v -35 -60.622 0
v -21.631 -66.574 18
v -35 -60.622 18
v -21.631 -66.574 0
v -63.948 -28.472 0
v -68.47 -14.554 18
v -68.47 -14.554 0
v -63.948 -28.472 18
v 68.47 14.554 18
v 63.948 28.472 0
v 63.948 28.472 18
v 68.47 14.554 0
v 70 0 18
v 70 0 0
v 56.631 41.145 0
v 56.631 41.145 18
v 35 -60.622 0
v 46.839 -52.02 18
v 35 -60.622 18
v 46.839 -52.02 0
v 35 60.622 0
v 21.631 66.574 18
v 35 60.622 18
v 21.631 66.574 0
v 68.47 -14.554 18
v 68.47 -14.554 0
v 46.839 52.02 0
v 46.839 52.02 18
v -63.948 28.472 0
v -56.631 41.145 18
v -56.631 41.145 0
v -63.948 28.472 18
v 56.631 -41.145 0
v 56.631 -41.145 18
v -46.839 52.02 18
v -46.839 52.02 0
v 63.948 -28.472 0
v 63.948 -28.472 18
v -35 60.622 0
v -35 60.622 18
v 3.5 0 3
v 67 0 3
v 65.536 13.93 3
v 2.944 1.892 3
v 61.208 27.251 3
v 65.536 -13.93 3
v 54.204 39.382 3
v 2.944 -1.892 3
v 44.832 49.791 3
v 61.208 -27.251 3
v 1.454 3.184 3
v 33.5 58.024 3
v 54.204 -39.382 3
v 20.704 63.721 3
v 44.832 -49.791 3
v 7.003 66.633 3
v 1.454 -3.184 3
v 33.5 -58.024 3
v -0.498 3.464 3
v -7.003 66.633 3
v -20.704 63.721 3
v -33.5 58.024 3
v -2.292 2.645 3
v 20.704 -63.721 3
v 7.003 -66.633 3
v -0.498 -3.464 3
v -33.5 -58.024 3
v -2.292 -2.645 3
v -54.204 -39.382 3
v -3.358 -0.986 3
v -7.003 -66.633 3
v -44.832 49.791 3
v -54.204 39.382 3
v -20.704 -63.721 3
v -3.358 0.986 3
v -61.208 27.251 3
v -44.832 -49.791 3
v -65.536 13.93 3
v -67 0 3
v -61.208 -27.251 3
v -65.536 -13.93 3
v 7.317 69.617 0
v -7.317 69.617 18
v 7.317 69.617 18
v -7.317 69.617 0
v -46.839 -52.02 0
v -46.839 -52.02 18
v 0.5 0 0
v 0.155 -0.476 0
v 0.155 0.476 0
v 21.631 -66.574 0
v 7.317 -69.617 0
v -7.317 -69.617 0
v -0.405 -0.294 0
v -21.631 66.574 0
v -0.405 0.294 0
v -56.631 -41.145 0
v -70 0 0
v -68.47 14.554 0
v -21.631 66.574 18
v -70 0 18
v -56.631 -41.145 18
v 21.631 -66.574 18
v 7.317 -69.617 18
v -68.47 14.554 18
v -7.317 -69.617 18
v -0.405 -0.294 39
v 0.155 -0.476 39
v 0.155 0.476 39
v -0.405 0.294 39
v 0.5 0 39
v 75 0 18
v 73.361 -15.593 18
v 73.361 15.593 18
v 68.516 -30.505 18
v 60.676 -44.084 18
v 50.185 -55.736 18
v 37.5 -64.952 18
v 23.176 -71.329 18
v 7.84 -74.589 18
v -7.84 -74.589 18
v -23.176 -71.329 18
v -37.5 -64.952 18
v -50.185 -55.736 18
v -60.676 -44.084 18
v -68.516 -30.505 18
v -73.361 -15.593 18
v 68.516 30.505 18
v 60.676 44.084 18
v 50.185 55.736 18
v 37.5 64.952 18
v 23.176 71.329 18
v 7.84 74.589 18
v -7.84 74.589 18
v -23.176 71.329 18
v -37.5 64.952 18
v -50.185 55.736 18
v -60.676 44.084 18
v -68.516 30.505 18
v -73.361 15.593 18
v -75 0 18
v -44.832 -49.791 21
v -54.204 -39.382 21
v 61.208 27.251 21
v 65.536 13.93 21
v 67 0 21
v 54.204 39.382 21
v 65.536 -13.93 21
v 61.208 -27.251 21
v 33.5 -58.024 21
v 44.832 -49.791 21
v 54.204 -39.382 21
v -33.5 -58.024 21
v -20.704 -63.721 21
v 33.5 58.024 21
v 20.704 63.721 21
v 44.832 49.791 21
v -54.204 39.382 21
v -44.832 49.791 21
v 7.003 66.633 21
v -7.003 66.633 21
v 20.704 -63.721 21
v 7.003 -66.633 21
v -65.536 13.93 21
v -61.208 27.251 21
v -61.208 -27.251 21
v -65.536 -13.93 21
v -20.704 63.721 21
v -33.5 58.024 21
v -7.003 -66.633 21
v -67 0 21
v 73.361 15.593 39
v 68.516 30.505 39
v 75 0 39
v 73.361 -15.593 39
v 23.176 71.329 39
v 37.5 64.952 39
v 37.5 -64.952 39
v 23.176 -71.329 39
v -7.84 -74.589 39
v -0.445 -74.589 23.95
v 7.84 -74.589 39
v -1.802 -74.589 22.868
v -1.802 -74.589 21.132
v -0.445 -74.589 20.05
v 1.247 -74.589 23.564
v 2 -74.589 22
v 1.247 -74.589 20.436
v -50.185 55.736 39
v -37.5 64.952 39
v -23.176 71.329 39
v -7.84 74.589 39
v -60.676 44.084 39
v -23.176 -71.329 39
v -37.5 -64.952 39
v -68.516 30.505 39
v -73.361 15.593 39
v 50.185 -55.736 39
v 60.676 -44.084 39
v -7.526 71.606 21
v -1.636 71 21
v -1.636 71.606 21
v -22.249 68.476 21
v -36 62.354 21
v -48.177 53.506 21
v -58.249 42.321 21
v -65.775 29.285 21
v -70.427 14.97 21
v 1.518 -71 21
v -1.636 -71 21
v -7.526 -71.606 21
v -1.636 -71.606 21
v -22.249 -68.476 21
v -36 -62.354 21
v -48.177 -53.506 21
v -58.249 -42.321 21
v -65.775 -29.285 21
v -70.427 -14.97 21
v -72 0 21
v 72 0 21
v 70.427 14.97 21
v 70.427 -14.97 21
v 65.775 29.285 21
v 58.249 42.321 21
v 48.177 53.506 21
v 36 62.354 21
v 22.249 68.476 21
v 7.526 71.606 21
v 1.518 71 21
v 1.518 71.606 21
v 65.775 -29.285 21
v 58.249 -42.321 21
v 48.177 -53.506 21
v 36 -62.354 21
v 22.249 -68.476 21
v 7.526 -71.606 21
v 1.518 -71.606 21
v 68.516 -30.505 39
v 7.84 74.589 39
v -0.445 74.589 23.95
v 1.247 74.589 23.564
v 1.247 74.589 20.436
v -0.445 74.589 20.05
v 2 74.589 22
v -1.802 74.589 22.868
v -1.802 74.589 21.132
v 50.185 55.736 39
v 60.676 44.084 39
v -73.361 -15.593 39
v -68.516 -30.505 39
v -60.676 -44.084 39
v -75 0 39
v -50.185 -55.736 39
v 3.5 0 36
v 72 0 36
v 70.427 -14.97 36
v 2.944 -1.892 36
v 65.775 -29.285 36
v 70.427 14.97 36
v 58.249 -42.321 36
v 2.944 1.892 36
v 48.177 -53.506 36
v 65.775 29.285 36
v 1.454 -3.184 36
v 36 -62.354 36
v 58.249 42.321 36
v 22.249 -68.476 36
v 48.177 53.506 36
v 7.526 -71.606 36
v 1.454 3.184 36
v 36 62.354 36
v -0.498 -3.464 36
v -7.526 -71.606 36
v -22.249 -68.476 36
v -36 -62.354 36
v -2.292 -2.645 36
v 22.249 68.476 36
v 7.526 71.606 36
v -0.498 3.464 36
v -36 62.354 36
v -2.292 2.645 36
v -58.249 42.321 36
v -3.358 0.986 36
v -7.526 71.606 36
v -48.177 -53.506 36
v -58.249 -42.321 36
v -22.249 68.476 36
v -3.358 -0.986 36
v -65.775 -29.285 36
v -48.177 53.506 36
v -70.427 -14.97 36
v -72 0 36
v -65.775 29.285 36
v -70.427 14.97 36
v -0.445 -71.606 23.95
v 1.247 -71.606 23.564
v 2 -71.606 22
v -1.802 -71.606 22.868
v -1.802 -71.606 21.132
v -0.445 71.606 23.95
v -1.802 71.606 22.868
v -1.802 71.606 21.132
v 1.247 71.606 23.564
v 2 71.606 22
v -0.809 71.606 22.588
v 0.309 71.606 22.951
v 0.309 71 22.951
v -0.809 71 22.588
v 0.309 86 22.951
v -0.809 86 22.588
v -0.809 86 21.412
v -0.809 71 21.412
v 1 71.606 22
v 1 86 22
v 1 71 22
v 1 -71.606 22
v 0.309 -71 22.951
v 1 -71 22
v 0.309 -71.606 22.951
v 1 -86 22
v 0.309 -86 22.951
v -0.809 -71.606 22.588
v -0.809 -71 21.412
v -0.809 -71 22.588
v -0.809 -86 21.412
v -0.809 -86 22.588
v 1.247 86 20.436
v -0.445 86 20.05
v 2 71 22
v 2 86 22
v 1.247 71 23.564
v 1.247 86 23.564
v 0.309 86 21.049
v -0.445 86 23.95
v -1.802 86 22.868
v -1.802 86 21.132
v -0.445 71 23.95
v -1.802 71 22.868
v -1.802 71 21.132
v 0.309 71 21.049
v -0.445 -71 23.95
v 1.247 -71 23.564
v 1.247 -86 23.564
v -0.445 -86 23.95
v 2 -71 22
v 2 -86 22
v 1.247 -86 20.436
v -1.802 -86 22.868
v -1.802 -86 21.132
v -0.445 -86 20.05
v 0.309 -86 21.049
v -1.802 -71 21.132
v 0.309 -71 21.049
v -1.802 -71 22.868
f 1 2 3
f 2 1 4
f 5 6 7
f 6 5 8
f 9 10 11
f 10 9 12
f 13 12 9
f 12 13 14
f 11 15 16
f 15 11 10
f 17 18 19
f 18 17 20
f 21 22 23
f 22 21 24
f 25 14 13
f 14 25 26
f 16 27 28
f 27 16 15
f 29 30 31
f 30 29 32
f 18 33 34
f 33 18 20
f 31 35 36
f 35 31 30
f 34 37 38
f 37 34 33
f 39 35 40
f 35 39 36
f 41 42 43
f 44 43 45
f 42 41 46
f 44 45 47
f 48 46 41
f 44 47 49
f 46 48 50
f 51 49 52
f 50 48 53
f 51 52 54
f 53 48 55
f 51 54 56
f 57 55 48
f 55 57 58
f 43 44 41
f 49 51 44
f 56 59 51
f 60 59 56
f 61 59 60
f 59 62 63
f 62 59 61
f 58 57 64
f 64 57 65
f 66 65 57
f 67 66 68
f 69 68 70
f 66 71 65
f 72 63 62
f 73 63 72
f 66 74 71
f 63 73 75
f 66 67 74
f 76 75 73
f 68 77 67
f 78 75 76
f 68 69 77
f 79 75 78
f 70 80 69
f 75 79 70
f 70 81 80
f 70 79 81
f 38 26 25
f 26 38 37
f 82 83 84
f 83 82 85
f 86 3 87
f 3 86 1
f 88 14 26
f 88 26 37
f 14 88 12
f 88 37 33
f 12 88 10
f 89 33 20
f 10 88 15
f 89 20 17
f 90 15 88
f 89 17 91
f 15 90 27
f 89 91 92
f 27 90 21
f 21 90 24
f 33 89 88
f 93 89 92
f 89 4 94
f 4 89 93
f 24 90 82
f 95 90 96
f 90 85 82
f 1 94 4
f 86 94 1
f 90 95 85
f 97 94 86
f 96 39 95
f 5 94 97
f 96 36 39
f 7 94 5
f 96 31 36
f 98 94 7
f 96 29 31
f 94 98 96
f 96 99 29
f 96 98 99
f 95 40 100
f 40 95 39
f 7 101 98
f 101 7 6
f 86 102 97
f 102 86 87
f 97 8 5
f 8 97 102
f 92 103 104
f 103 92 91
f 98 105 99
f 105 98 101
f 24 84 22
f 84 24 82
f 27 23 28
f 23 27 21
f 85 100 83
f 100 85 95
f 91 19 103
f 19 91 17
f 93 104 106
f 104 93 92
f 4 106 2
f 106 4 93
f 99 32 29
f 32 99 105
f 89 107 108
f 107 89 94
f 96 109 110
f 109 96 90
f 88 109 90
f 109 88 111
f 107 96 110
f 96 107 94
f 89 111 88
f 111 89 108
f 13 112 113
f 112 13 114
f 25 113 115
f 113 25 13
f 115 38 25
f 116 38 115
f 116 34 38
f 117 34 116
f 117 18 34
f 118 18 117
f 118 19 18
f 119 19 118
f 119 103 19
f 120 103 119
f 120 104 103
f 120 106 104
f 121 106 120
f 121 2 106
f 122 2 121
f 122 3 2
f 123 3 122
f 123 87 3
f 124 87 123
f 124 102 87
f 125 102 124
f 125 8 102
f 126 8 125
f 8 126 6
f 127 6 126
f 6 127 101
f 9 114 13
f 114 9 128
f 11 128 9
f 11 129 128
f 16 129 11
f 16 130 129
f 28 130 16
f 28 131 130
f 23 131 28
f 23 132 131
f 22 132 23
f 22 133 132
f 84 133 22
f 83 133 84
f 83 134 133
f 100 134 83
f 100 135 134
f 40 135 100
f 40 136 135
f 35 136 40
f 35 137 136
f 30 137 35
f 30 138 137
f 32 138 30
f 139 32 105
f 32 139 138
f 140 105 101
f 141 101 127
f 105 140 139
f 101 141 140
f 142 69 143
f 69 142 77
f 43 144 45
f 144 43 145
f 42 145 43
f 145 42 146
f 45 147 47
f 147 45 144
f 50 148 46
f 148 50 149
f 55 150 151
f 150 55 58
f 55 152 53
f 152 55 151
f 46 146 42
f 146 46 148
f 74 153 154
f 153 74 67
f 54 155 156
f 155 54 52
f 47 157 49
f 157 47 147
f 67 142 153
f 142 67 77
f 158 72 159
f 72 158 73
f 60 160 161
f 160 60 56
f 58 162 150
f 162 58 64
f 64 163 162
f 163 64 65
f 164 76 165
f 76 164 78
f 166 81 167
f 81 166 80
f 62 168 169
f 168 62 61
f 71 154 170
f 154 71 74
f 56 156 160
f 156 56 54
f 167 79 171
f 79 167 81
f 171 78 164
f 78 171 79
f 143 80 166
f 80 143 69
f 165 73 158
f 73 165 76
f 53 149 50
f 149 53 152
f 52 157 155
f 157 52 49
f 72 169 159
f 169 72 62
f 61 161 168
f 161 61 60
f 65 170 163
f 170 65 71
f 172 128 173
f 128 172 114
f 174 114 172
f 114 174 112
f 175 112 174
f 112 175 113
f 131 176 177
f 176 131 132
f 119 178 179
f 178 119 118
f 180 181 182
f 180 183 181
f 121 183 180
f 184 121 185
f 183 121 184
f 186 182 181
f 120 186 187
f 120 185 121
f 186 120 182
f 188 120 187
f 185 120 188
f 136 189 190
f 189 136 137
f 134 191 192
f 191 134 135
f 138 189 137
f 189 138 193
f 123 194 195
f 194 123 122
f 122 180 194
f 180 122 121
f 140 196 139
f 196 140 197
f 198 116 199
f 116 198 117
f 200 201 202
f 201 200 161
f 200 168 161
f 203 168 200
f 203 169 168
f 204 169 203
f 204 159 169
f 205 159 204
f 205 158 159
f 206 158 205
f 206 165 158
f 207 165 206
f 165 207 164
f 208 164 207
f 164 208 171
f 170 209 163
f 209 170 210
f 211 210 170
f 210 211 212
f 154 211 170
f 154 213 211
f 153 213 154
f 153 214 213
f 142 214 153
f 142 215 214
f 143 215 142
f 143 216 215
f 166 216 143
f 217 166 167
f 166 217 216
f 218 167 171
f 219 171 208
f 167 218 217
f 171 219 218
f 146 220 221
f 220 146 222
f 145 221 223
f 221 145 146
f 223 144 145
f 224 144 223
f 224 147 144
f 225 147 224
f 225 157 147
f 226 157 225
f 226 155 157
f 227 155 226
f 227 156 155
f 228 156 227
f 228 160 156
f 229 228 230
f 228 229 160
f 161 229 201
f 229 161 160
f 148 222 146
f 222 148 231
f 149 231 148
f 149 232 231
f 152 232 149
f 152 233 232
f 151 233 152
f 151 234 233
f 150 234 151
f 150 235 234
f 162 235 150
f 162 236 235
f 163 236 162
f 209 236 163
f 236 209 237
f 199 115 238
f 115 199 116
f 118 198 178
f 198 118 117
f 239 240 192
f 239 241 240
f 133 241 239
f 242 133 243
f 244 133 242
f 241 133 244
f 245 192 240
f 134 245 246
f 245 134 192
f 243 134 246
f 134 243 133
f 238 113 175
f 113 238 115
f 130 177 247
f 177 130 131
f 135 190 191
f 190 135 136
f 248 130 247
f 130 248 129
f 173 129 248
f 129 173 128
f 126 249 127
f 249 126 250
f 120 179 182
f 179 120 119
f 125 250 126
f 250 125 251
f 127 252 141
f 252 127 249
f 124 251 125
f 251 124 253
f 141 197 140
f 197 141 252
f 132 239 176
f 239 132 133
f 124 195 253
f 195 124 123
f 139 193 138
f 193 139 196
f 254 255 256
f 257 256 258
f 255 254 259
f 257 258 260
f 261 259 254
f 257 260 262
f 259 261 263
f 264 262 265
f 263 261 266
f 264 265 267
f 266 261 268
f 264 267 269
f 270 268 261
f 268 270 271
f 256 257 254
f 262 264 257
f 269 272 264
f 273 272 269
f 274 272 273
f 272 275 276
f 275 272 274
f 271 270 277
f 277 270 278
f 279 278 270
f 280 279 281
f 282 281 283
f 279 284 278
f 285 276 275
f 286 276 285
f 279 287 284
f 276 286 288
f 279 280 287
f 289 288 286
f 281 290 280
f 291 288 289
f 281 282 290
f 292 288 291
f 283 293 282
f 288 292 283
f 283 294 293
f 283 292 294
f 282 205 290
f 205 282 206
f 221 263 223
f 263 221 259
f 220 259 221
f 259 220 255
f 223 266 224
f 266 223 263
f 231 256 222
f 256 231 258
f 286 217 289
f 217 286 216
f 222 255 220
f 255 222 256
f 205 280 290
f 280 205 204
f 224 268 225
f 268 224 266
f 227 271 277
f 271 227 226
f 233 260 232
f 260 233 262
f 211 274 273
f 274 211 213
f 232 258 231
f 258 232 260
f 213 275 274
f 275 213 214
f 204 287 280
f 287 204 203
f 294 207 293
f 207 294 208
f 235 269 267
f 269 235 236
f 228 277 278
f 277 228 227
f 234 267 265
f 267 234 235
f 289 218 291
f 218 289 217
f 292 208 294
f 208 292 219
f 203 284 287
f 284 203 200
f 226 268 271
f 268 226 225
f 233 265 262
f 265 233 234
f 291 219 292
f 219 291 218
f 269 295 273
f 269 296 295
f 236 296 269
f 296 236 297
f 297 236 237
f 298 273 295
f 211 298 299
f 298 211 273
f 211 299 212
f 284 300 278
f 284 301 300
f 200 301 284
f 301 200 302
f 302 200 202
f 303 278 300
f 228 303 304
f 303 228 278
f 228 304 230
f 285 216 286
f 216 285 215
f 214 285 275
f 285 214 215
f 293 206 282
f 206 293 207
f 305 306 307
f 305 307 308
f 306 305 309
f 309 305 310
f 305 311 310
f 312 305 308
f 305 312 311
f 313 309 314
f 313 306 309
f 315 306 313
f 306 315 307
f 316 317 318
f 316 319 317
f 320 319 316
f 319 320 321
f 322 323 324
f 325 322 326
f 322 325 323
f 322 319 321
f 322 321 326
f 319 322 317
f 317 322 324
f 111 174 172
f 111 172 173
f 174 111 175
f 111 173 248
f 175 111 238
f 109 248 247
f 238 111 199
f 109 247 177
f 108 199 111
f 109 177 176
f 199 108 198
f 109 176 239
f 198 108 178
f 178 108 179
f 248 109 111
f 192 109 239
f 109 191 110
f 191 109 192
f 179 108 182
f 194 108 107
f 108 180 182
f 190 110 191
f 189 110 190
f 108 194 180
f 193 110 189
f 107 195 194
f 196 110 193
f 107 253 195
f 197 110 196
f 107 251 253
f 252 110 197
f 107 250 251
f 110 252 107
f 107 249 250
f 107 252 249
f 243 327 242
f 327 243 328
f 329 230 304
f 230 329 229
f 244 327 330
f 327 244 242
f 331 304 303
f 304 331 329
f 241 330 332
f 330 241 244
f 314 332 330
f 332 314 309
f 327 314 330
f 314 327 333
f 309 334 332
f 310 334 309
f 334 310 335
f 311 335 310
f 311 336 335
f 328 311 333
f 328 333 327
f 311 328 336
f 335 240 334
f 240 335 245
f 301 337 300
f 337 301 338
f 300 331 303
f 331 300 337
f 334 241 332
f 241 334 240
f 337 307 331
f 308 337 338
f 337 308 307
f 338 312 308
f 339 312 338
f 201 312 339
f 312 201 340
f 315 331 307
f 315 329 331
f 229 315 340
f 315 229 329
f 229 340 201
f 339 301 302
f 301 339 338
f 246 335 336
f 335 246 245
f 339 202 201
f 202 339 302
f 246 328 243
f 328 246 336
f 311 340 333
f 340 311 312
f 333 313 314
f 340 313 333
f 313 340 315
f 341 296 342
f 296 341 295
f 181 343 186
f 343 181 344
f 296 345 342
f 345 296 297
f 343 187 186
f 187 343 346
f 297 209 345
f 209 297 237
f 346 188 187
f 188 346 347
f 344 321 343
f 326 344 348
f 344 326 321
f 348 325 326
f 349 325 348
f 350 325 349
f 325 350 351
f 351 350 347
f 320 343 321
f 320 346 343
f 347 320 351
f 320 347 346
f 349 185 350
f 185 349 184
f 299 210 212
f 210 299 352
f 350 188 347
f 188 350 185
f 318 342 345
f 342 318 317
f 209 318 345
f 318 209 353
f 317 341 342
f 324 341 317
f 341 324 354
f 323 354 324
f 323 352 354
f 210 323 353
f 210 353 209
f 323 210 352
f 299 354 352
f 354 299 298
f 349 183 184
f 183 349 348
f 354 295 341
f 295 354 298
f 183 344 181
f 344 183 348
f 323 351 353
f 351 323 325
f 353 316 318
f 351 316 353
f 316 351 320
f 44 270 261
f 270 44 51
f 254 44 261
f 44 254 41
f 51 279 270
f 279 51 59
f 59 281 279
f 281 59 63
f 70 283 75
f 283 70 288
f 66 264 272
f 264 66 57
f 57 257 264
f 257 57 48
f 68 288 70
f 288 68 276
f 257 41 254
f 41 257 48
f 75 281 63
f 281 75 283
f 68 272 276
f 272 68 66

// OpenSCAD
Dmax=140; // diameter of main volume
wallThikness=3; // Товщина стінки обєму з водою 
hWaterChamber=30; // Висота об'єму з водою 
lFaska=5; // Величина виступ-зацепа зверху об'єму з водою 
DWorkPiston=10; // Діаметр робочого(их) поршня(ів)
LWorkPiston=20; // Довжина робочого(их) поршня(ів)
LWorkCilinder=34+wallThikness; // Довжина робочого(их) циліндра(ів)
dCentralHole=1; // Отвір посередині для штоку поршня-теплоакумулятора
// Model code below
module tube(dMax, thikness, lenghth) {
  difference() {
    cylinder(h=lenghth, r1=dMax/2, r2=dMax/2);
   
    translate([0, 0, -1])
        
    cylinder(lenghth+2, dMax/2-thikness, dMax/2-thikness);
  }
}


module disk(dMax, thikness) {
    cylinder(thikness, dMax/2, dMax/2);
}


////////////////////////

module main() {
    
// Дно  
difference() {
  disk(Dmax, wallThikness);
  translate([0, 0, -0.1])
  cylinder(wallThikness+0.2, dCentralHole/2, dCentralHole/2);
}

// Бокова стінка яка всередині циліндра
translate([0, 0, wallThikness])
  tube(Dmax, wallThikness, hWaterChamber/2);

//color("orange")  
translate([0, 0, wallThikness+hWaterChamber/2])
  tube(Dmax+2*lFaska, lFaska+wallThikness, wallThikness);


// Бокова стінка яка ззовні циліндра
translate([0, 0, 2*wallThikness+hWaterChamber/2])
  difference() {

    tube(Dmax+2*lFaska, wallThikness, hWaterChamber/2);
   
     // Отвір для вводу води 
     translate([0, Dmax/2+lFaska-wallThikness-2, 1])
       rotate([-90,0,0])
         cylinder(wallThikness+15-1, 1, 1);

     // Отвір для виводу води 
     translate([0, -(Dmax/2+lFaska-wallThikness-2), 1])
       rotate([90,0,0])
         cylinder(wallThikness+15-1+500, 1, 1);

  }
/*  
  color("red") 
translate([0, 0, 2*wallThikness+hWaterChamber/2])  

translate([0, Dmax/2+lFaska-wallThikness-2, 1])
  rotate([-90,0,0])
    cylinder(wallThikness+15-1, 1, 1);
*/  

// Верхня кришка
translate([0, 0, 2*wallThikness+hWaterChamber])
  difference() {
    disk(Dmax+2*lFaska, wallThikness);
    translate([0, 0, -0.1])
    cylinder(wallThikness+0.2, dCentralHole/2, dCentralHole/2);
  }

// Штуцер для вводу води     
translate([0, Dmax/2+lFaska-wallThikness-1, 2*wallThikness+hWaterChamber/2+1])
  rotate([-90,0,0])
    tube(4, 1, 15);

// Штуцер для виводу води     
translate([0, -(Dmax/2+lFaska-wallThikness-1), 2*wallThikness+hWaterChamber/2+1])
  rotate([90,0,0])
    tube(4, 1, 15);


// Отвір посередині для штоку поршня-теплоакумулятора
translate([0, 0, wallThikness])
  tube(dCentralHole+2*wallThikness, wallThikness, hWaterChamber+wallThikness);

/* 
translate([0, LWorkCilinder, 2*wallThikness+hWaterChamber+DWorkPiston/2])
  rotate([-90,90,0])
     tube(DWorkPiston, wallThikness, LWorkCilinder);
    
translate([0, LWorkCilinder+LWorkCilinder-wallThikness, 2*wallThikness+hWaterChamber+DWorkPiston/2])
  rotate([-90,90,0])
     cylinder(wallThikness, DWorkPiston+wallThikness, DWorkPiston+wallThikness);     

*/
  
 }

main();
 
 
 
 

rotate([0,-90,0])
  translate([-100,0,0])
    projection(cut=true)
      translate([0,0,0])
        rotate([0,90,0]) main(); 
 
